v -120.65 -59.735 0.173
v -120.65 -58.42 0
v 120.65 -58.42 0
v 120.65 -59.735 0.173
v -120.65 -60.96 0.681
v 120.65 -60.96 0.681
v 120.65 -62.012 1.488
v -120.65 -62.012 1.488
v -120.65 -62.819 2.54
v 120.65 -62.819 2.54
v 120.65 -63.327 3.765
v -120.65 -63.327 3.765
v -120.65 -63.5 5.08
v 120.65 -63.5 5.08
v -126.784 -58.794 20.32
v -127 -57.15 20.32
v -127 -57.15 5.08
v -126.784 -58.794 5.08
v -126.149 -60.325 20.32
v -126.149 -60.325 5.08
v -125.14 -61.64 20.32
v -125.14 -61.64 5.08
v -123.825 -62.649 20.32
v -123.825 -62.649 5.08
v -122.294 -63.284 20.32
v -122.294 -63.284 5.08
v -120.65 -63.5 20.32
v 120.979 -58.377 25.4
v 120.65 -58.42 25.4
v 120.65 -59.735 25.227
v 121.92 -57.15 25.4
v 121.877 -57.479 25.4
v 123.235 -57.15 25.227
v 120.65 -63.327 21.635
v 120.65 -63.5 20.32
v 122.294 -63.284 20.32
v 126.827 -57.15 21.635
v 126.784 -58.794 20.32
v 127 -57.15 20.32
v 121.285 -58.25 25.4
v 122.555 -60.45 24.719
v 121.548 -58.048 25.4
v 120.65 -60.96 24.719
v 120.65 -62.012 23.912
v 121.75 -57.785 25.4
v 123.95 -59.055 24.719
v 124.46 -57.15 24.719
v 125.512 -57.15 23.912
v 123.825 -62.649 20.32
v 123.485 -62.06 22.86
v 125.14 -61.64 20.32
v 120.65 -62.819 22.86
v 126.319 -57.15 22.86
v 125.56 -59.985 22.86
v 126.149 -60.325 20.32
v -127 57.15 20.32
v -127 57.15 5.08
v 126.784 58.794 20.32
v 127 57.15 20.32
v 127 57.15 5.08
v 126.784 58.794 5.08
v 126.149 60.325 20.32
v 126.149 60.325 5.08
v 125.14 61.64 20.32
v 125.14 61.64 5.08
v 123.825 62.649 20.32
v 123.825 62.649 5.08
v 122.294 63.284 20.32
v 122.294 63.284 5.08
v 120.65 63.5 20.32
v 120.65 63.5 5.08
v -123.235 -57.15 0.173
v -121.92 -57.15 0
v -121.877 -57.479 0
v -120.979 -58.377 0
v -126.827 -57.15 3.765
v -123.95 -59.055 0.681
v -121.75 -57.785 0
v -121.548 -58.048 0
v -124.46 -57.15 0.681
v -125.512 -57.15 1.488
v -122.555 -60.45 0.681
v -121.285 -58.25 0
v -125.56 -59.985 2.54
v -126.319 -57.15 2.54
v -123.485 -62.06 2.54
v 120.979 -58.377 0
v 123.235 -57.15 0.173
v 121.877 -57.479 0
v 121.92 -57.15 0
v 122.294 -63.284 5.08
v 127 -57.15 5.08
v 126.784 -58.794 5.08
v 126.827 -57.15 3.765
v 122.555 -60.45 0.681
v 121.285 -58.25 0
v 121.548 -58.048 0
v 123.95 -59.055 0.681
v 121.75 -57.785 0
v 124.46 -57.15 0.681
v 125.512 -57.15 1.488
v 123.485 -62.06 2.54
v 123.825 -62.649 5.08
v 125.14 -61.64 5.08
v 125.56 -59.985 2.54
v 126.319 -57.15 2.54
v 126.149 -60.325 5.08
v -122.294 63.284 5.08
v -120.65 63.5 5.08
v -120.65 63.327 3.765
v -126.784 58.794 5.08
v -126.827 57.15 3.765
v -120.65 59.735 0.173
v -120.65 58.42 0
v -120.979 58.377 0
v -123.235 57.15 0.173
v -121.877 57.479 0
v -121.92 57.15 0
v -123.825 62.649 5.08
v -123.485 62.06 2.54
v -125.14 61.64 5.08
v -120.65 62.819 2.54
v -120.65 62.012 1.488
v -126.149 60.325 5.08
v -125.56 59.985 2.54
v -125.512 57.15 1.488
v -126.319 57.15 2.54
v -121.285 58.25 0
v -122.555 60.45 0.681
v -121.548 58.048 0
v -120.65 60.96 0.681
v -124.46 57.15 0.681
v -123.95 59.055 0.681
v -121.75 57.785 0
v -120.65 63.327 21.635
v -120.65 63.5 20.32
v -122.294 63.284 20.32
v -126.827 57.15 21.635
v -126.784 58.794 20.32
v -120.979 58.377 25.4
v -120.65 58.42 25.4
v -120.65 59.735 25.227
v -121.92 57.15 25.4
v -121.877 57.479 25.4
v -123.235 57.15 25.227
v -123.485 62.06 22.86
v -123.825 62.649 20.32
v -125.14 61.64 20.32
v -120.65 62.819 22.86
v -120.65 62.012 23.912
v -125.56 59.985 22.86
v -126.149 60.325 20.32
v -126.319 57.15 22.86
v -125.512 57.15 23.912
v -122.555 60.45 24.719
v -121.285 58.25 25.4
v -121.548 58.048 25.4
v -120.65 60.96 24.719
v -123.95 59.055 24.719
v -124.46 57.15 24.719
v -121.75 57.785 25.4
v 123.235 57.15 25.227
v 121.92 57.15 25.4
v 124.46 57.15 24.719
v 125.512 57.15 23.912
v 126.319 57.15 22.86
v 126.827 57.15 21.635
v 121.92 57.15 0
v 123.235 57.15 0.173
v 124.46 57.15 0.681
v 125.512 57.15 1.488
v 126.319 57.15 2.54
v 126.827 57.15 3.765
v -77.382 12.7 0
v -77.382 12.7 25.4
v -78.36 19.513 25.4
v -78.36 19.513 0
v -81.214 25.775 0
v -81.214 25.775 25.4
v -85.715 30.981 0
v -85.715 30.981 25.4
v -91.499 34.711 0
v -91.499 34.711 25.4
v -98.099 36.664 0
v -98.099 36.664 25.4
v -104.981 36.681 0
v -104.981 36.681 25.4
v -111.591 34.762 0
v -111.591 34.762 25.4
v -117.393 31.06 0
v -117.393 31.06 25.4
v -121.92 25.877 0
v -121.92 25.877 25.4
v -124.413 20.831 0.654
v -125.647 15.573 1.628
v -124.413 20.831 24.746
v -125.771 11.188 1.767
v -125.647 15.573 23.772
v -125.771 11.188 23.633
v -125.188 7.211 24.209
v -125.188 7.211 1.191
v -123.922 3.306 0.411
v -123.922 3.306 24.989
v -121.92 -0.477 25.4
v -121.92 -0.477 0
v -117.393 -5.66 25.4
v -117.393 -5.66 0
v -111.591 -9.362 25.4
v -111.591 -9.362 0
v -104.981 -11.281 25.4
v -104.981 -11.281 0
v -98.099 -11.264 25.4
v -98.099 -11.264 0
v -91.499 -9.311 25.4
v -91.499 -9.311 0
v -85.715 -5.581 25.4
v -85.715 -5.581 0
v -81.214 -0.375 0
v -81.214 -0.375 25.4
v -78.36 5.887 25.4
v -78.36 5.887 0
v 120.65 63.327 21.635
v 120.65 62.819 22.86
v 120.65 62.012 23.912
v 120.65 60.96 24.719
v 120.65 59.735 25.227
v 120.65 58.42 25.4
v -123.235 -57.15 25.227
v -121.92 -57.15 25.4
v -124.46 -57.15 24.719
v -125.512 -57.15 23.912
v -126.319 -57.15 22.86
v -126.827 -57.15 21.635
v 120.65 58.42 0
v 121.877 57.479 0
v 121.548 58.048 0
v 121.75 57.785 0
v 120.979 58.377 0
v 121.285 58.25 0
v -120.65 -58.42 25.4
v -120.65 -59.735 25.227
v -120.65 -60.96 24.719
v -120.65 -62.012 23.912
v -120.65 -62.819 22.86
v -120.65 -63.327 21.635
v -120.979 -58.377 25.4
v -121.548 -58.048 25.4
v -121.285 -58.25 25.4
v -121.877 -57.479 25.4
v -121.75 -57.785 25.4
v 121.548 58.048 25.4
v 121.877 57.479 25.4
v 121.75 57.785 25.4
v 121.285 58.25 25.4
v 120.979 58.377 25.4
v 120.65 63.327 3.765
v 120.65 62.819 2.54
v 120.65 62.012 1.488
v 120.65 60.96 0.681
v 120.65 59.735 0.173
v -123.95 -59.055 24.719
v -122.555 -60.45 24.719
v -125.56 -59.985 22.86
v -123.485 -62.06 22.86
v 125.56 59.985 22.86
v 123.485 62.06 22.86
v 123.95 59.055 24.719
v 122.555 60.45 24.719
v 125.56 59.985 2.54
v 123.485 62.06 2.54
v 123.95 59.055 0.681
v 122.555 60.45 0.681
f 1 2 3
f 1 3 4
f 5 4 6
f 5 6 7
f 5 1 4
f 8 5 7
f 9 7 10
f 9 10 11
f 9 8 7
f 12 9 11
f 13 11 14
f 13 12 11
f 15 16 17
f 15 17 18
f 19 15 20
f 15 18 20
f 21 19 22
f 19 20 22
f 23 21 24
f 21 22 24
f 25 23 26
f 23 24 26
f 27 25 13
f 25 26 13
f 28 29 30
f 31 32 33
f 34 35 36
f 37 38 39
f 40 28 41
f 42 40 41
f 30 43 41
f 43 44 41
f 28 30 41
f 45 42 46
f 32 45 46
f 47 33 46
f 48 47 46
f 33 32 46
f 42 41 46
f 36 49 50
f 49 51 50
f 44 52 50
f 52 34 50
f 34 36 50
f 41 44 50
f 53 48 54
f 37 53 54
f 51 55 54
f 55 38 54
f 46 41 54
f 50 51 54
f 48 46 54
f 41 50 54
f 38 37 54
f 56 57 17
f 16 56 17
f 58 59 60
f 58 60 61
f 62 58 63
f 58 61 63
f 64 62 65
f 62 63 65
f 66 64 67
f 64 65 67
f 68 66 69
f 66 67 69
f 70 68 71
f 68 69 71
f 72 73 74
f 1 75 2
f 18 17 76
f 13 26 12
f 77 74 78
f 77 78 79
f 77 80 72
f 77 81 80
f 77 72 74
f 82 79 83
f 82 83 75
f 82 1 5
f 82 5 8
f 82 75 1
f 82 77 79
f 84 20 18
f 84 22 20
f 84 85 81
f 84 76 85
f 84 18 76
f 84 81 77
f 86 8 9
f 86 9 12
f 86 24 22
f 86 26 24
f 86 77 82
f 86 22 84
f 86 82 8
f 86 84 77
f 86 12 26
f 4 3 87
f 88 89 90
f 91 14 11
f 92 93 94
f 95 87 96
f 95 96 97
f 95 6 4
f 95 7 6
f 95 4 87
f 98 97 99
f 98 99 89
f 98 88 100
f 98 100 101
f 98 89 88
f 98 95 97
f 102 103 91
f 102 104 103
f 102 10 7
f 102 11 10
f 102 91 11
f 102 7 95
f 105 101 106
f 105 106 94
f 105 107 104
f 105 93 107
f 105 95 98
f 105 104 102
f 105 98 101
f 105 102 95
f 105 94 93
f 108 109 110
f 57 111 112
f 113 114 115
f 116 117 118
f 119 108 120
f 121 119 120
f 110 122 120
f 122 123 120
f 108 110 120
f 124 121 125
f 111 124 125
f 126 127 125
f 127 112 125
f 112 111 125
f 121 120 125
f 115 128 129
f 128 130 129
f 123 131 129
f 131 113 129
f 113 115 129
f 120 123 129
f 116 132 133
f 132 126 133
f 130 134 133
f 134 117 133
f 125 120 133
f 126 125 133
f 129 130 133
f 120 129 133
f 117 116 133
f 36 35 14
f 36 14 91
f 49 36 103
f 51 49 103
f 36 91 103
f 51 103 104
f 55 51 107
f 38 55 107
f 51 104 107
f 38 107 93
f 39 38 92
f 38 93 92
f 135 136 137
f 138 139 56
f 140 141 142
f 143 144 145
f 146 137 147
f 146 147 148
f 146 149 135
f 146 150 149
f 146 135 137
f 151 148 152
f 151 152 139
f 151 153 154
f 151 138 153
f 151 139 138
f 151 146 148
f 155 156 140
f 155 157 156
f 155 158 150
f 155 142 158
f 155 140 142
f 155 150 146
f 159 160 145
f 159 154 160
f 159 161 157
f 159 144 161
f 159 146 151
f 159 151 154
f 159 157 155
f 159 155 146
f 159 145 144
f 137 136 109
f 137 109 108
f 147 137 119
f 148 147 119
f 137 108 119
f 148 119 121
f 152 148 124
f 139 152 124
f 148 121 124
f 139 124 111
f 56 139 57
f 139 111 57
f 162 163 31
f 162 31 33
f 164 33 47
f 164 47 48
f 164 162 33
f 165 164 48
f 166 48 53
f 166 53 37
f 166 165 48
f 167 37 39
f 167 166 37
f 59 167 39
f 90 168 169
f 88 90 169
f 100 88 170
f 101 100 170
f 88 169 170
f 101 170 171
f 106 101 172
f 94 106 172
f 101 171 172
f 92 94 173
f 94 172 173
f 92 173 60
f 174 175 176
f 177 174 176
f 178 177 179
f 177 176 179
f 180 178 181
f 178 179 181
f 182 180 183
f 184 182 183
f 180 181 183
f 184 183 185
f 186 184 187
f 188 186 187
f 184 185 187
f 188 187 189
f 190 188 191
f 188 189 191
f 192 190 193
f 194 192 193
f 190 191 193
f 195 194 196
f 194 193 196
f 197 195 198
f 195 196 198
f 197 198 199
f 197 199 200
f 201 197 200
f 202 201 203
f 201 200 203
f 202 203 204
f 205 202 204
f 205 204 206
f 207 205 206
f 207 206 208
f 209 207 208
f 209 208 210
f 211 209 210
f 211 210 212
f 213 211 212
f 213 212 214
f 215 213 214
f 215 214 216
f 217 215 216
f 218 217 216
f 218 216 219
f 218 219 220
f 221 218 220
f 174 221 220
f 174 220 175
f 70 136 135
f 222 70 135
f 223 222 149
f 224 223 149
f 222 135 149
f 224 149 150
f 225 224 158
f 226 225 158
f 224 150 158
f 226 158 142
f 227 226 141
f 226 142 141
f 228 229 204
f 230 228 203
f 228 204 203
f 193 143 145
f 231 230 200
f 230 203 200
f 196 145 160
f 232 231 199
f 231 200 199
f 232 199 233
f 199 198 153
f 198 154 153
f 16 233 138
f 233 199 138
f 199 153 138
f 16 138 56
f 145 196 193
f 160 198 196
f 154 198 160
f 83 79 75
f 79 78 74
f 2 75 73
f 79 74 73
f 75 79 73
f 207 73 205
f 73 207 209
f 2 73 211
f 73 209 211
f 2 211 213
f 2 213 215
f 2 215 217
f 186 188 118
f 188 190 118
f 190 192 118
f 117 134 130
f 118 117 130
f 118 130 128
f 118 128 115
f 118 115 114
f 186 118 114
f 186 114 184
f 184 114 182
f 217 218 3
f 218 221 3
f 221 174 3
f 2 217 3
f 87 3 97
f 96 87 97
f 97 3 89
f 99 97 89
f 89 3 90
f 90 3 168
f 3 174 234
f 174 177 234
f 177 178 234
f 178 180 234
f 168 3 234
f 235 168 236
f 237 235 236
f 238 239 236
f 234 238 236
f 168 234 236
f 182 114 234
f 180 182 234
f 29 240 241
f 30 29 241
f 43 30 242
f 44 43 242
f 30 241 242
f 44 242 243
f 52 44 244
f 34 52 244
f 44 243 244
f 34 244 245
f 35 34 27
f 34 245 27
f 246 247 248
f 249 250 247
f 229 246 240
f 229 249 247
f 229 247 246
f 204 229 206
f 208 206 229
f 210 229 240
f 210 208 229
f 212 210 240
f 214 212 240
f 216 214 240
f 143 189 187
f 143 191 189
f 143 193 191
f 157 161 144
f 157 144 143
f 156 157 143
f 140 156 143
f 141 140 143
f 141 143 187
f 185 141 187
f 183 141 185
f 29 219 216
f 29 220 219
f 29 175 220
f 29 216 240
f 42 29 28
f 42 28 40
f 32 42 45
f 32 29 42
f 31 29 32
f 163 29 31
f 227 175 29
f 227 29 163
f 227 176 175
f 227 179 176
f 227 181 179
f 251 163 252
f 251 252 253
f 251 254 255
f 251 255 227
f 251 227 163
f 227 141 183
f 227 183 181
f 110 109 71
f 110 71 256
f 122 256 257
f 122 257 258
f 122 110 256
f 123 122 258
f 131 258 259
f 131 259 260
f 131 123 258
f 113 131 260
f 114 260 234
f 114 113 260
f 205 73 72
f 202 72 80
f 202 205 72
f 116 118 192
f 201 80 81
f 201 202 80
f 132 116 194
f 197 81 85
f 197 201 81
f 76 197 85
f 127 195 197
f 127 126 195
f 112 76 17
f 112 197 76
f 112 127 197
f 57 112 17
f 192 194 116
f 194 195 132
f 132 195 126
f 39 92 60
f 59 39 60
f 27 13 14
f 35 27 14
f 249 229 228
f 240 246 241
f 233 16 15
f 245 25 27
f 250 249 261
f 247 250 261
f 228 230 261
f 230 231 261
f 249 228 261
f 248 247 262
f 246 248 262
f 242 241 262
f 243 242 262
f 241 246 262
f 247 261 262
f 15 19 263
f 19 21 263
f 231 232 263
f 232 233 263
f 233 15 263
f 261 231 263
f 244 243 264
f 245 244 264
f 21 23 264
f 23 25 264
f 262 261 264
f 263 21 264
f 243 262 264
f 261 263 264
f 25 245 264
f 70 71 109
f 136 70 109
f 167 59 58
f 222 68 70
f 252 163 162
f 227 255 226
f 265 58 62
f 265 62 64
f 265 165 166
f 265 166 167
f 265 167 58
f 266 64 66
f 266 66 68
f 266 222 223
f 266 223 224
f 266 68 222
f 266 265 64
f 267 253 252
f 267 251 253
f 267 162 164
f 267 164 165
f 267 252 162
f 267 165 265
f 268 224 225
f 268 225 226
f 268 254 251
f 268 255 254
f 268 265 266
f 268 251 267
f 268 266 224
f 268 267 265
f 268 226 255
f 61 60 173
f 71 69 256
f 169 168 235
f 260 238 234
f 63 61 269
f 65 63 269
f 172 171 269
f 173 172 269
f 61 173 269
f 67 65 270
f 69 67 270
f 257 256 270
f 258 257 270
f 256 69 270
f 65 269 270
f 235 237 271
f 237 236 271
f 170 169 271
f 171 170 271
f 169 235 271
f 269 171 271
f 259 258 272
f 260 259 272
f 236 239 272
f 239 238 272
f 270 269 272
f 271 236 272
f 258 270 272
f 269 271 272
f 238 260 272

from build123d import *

# Parameters (mm, degrees)
F1_DEPTH     = 25.4
F2_R         = 24.2182856507
F3_DEPTH     = 25.401
F5_T1_DEPTH  = 114.3
F5_T3_DEPTH  = 241.3
F5_T6_ANGLE  = 90
F5_T8_ANGLE  = 90
F5_T10_ANGLE = 90
F5_T12_ANGLE = 90
F5_T14_ANGLE = 90
F5_T16_ANGLE = 90
F5_T18_ANGLE = 90
F5_T20_ANGLE = 90


# Not quite as in the source:
# - a fillet or chamfer that OpenCascade refuses, or shapes differently, is made with other operations: its cross-section is extruded or revolved along the edge and cut away or added
# - a feature of the source that left no trace in its solid (it failed there, or was rolled back) is left out


with BuildPart() as f1:
    # F0 (on Top) → F1 (new body)
    with BuildSketch(Plane.XY):
        with BuildLine():
            Line((120.65, 63.5), (-120.65, 63.5))
            ThreePointArc((-120.65, 63.5), (-125.1401280605, 61.6401280605), (-127, 57.15))
            Line((-127, 57.15), (-127, -57.15))
            ThreePointArc((-127, -57.15), (-125.1401280605, -61.6401280605), (-120.65, -63.5))
            Line((-120.65, -63.5), (120.65, -63.5))
            ThreePointArc((120.65, -63.5), (125.1401280605, -61.6401280605), (127, -57.15))
            Line((127, -57.15), (127, 57.15))
            ThreePointArc((127, 57.15), (125.1401280605, 61.6401280605), (120.65, 63.5))
        make_face()
    extrude(amount=F1_DEPTH)

    # F2 (on face) → F3 (cut, through all)
    with BuildSketch(Plane.XY.offset(25.4)):
        with Locations((-101.6, 12.7)):
            Circle(F2_R)
    extrude(amount=-F3_DEPTH, mode=Mode.SUBTRACT)

    # F5: fillet of radius 5.08 on 16 edges, made by hand

    # F5_s2 → F5_t1 (cut)
    with BuildSketch(Plane.XZ.offset(-57.15)):
        with BuildLine():
            ThreePointArc((121.92, 0), (125.5121024484, 1.4878975516), (127, 5.08))
            Line((127, 5.08), (127, 0))
            Line((127, 0), (121.92, 0))
        make_face()
        with BuildLine():
            ThreePointArc((-121.92, 0), (-125.5121024484, 1.4878975516), (-127, 5.08))
            Line((-127, 5.08), (-127, 0))
            Line((-127, 0), (-121.92, 0))
        make_face()
        with BuildLine():
            ThreePointArc((121.92, 25.4), (125.5121024484, 23.9121024484), (127, 20.32))
            Line((127, 20.32), (127, 25.4))
            Line((127, 25.4), (121.92, 25.4))
        make_face()
        with BuildLine():
            ThreePointArc((-121.92, 25.4), (-125.5121024484, 23.9121024484), (-127, 20.32))
            Line((-127, 20.32), (-127, 25.4))
            Line((-127, 25.4), (-121.92, 25.4))
        make_face()
    extrude(amount=F5_T1_DEPTH, mode=Mode.SUBTRACT)

    # F5_s4 → F5_t3 (cut)
    with BuildSketch(Plane.YZ.offset(-120.65)):
        with BuildLine():
            ThreePointArc((63.5, 5.08), (62.0121024484, 1.4878975516), (58.42, 0))
            Line((58.42, 0), (63.5, 0))
            Line((63.5, 0), (63.5, 5.08))
        make_face()
        with BuildLine():
            ThreePointArc((63.5, 20.32), (62.0121024484, 23.9121024484), (58.42, 25.4))
            Line((58.42, 25.4), (63.5, 25.4))
            Line((63.5, 25.4), (63.5, 20.32))
        make_face()
        with BuildLine():
            ThreePointArc((-58.42, 0), (-62.0121024484, 1.4878975516), (-63.5, 5.08))
            Line((-63.5, 5.08), (-63.5, 0))
            Line((-63.5, 0), (-58.42, 0))
        make_face()
        with BuildLine():
            ThreePointArc((-58.42, 25.4), (-62.0121024484, 23.9121024484), (-63.5, 20.32))
            Line((-63.5, 20.32), (-63.5, 25.4))
            Line((-63.5, 25.4), (-58.42, 25.4))
        make_face()
    extrude(amount=F5_T3_DEPTH, mode=Mode.SUBTRACT)

    # F5_s5 → F5_t6 (revolve, cut)
    with BuildSketch(Plane.XZ.offset(-57.15)):
        with BuildLine():
            ThreePointArc((127, 5.08), (125.5121024484, 1.4878975516), (121.92, 0))
            Line((121.92, 0), (127, 0))
            Line((127, 0), (127, 5.08))
        make_face()
    revolve(axis=Axis((120.65, 57.15, 0), (0, 0, 1)), revolution_arc=F5_T6_ANGLE, mode=Mode.SUBTRACT)

    # F5_s7 → F5_t8 (revolve, cut)
    with BuildSketch(Plane.XZ.offset(-57.15)):
        with BuildLine():
            ThreePointArc((127, 20.32), (125.5121024484, 23.9121024484), (121.92, 25.4))
            Line((121.92, 25.4), (127, 25.4))
            Line((127, 25.4), (127, 20.32))
        make_face()
    revolve(axis=Axis((120.65, 57.15, 25.4), (0, 0, 1)), revolution_arc=F5_T8_ANGLE, mode=Mode.SUBTRACT)

    # F5_s9 → F5_t10 (revolve, cut)
    with BuildSketch(Plane.YZ.offset(-120.65)):
        with BuildLine():
            ThreePointArc((63.5, 5.08), (62.0121024484, 1.4878975516), (58.42, 0))
            Line((58.42, 0), (63.5, 0))
            Line((63.5, 0), (63.5, 5.08))
        make_face()
    revolve(axis=Axis((-120.65, 57.15, 0), (0, 0, 1)), revolution_arc=F5_T10_ANGLE, mode=Mode.SUBTRACT)

    # F5_s11 → F5_t12 (revolve, cut)
    with BuildSketch(Plane.YZ.offset(-120.65)):
        with BuildLine():
            ThreePointArc((63.5, 20.32), (62.0121024484, 23.9121024484), (58.42, 25.4))
            Line((58.42, 25.4), (63.5, 25.4))
            Line((63.5, 25.4), (63.5, 20.32))
        make_face()
    revolve(axis=Axis((-120.65, 57.15, 25.4), (0, 0, 1)), revolution_arc=F5_T12_ANGLE, mode=Mode.SUBTRACT)

    # F5_s13 → F5_t14 (revolve, cut)
    with BuildSketch(Plane.YZ.offset(120.65)):
        with BuildLine():
            ThreePointArc((-58.42, 0), (-62.0121024484, 1.4878975516), (-63.5, 5.08))
            Line((-63.5, 5.08), (-63.5, 0))
            Line((-63.5, 0), (-58.42, 0))
        make_face()
    revolve(axis=Axis((120.65, -57.15, 0), (0, 0, 1)), revolution_arc=F5_T14_ANGLE, mode=Mode.SUBTRACT)

    # F5_s15 → F5_t16 (revolve, cut)
    with BuildSketch(Plane.XZ.offset(57.15)):
        with BuildLine():
            ThreePointArc((-121.92, 0), (-125.5121024484, 1.4878975516), (-127, 5.08))
            Line((-127, 5.08), (-127, 0))
            Line((-127, 0), (-121.92, 0))
        make_face()
    revolve(axis=Axis((-120.65, -57.15, 0), (0, 0, 1)), revolution_arc=F5_T16_ANGLE, mode=Mode.SUBTRACT)

    # F5_s17 → F5_t18 (revolve, cut)
    with BuildSketch(Plane.YZ.offset(120.65)):
        with BuildLine():
            ThreePointArc((-58.42, 25.4), (-62.0121024484, 23.9121024484), (-63.5, 20.32))
            Line((-63.5, 20.32), (-63.5, 25.4))
            Line((-63.5, 25.4), (-58.42, 25.4))
        make_face()
    revolve(axis=Axis((120.65, -57.15, 25.4), (0, 0, 1)), revolution_arc=F5_T18_ANGLE, mode=Mode.SUBTRACT)

    # F5_s19 → F5_t20 (revolve, cut)
    with BuildSketch(Plane.XZ.offset(57.15)):
        with BuildLine():
            ThreePointArc((-121.92, 25.4), (-125.5121024484, 23.9121024484), (-127, 20.32))
            Line((-127, 20.32), (-127, 25.4))
            Line((-127, 25.4), (-121.92, 25.4))
        make_face()
    revolve(axis=Axis((-120.65, -57.15, 25.4), (0, 0, 1)), revolution_arc=F5_T20_ANGLE, mode=Mode.SUBTRACT)


solid = f1.part
